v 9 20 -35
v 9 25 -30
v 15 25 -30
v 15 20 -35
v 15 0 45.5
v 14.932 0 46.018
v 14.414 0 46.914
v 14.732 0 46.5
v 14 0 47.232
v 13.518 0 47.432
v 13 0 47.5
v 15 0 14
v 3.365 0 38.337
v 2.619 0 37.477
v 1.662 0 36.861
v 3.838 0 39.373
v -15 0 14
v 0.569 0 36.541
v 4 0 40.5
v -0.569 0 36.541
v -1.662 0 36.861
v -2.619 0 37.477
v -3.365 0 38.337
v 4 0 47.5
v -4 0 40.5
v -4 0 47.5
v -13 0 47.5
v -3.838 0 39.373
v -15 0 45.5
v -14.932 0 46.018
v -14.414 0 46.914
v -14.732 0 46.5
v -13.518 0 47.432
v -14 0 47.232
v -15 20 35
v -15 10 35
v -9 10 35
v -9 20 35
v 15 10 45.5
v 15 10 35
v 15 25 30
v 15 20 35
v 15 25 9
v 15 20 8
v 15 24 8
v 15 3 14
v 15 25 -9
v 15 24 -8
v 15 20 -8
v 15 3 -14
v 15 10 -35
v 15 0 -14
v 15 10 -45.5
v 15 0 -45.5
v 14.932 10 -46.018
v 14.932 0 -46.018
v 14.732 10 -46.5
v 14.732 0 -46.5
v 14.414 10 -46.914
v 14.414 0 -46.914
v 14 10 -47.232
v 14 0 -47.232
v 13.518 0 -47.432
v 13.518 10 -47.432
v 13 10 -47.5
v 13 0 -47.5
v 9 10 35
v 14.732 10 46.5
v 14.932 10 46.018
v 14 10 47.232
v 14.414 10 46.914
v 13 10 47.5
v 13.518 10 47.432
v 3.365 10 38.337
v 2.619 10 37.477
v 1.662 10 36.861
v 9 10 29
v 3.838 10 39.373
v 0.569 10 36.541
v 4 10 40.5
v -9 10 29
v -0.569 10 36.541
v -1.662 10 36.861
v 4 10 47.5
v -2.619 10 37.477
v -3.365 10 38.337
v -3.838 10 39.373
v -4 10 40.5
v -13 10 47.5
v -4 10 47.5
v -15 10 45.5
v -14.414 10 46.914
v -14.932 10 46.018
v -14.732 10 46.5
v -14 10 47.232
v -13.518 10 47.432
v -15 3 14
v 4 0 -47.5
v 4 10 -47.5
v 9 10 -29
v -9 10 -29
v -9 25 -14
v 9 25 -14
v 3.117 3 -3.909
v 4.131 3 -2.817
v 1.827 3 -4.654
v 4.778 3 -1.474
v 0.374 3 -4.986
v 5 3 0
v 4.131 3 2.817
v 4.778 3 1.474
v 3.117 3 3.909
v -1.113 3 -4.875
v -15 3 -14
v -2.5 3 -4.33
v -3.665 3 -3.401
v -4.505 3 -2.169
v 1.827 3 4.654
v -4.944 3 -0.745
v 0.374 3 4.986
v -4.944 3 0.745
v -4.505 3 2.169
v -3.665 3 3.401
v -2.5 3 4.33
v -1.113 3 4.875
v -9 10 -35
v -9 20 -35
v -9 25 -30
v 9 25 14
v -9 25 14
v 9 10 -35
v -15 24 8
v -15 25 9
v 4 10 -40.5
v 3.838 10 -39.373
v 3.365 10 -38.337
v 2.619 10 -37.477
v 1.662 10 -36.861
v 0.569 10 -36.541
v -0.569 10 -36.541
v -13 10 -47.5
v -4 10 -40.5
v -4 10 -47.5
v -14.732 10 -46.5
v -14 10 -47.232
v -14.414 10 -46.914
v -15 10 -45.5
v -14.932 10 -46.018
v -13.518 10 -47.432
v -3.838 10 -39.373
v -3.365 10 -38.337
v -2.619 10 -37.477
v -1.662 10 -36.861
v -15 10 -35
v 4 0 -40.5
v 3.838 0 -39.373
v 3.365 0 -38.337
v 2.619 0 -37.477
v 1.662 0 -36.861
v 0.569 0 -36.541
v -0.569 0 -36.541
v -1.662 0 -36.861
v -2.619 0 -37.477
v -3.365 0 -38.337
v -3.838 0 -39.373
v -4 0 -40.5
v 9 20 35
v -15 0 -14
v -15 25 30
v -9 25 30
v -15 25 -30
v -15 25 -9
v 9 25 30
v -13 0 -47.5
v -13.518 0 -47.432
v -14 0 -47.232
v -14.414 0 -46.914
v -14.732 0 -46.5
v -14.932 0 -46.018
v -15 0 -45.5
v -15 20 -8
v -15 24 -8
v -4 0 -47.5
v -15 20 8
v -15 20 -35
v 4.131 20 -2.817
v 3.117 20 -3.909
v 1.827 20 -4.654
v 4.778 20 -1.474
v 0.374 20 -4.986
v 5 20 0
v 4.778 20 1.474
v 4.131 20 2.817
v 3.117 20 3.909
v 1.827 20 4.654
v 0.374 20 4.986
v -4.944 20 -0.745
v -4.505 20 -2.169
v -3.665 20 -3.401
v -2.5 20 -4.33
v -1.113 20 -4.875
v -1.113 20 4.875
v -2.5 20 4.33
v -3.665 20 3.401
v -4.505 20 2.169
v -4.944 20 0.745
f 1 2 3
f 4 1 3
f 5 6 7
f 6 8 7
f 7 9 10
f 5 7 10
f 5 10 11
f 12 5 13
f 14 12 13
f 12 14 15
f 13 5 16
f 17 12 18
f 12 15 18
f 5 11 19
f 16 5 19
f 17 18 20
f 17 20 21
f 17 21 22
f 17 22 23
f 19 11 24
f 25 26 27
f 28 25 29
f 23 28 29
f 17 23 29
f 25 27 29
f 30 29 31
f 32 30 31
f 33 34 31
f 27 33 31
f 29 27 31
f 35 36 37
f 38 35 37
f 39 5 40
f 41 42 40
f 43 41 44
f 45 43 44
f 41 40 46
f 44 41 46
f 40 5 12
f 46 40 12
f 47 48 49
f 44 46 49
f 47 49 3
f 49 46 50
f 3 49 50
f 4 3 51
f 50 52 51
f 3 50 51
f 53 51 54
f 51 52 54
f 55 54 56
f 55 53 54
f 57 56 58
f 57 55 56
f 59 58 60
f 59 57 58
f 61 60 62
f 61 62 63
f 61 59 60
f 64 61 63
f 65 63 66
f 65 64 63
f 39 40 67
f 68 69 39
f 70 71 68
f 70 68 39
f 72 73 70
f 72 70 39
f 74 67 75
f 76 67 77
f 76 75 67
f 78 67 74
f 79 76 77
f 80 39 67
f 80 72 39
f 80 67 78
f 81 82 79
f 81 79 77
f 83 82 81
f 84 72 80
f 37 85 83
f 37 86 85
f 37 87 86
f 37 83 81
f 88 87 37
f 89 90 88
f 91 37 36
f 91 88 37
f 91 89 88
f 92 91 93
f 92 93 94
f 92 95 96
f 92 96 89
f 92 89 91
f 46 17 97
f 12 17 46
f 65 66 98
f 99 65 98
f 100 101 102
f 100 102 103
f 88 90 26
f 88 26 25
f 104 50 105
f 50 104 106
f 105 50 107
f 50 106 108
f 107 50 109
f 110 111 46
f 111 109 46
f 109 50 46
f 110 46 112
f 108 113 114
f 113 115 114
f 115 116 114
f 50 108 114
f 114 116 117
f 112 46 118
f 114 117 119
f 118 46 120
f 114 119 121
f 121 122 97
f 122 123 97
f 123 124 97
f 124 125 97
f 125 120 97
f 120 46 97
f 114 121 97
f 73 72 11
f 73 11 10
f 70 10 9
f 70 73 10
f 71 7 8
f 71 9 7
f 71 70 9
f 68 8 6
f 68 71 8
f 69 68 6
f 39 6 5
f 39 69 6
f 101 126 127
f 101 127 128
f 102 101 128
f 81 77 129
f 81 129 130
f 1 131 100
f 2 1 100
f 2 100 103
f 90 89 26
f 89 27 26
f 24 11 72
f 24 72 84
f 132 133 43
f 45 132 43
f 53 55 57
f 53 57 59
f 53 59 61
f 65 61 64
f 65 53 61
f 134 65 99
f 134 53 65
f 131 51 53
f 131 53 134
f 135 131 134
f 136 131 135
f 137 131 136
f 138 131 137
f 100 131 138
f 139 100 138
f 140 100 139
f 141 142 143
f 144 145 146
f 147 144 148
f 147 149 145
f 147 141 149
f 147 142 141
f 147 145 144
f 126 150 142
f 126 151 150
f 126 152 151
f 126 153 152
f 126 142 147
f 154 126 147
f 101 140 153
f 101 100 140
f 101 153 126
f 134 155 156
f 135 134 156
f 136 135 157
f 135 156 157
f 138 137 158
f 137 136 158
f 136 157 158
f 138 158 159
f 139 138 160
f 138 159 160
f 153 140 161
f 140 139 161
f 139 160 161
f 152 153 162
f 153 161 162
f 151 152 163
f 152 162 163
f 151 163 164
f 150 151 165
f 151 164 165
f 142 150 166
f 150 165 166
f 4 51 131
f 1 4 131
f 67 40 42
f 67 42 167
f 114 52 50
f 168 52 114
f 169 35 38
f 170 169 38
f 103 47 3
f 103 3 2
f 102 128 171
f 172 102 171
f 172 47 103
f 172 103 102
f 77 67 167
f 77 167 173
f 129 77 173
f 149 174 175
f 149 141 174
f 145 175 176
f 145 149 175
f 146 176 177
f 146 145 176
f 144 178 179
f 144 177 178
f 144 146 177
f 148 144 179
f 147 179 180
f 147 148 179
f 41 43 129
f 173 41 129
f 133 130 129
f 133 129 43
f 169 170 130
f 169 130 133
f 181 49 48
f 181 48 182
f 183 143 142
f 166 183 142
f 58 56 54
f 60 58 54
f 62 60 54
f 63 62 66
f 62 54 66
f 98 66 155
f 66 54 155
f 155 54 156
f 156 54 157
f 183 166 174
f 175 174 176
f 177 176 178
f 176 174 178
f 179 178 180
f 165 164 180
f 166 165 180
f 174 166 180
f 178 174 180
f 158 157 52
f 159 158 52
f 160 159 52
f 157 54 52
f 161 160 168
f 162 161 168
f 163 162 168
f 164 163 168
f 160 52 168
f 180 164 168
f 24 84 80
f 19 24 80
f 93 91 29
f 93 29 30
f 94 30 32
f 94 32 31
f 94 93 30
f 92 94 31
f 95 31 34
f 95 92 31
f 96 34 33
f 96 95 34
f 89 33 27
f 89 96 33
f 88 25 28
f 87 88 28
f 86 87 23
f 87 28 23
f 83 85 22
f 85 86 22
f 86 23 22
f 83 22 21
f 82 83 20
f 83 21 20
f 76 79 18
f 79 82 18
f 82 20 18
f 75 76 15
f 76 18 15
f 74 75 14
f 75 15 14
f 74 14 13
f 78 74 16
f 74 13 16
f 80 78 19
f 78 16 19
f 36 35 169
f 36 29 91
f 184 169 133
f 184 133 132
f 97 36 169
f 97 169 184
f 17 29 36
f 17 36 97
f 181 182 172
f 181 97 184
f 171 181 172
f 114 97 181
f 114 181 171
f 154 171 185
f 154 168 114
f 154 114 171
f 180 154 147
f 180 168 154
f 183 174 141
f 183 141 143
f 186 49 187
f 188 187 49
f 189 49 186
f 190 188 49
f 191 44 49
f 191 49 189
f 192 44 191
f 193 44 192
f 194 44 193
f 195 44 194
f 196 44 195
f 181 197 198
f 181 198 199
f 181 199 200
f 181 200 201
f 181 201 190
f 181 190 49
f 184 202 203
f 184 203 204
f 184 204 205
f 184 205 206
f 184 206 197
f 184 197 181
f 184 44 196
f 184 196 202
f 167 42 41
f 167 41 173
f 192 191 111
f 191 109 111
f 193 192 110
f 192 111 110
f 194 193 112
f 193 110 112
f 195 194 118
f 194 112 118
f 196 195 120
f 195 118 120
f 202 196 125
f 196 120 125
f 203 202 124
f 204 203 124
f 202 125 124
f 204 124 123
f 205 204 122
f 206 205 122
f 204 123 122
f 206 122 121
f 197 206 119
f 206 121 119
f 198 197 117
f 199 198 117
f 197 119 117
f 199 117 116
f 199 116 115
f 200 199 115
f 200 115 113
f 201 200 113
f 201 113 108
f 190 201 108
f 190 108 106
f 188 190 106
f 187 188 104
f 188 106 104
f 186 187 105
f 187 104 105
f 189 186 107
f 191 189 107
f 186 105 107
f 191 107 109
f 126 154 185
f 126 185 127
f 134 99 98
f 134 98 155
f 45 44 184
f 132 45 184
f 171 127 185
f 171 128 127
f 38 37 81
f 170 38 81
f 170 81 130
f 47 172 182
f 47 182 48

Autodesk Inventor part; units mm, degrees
ref_plane "YZ Plane" through (0, 0, 0) normal (1, 0, 0) x (0, 1, 0)
ref_plane "XZ Plane" through (0, 0, 0) normal (0, 1, 0) x (-1, 0, 0)
ref_plane "XY Plane" through (0, 0, 0) normal (0, 0, 1) x (1, 0, 0)
sketch "Schizzo1" plane through (0, 0, 0) normal (0, 1, 0) x (-1, 0, 0)
  line L0 (0, 0) -> (15, 0) construction
  line L1 (15, 0) -> (15, -47.5)
  line L2 (15, -47.5) -> (4, -47.5)
  line L3 (4, -47.5) -> (4, -40.5)
  line L4 (0, 0) -> (0, -36.5) construction
  arc A0 (4, -40.5) -> (0, -36.5) centre (0, -40.5) ccw
  arc A1 (0, -5) -> (5, 0) centre (0, 0) ccw
  line L5 (0, 0) -> (0, -8) construction
  line L6 (0, -8) -> (15, -8)
  line L7 (15, 0) -> (15, -14)
  line L8 (15, -14) -> (0, -14)
  line L9 (15, -35) -> (9, -35)
  line L10 (9, -35) -> (9, -14)
  line L11 (0, 0) -> (-15, 0) construction
  line L12 (-15, 0) -> (-15, -47.5)
  line L13 (-15, -47.5) -> (-4, -47.5)
  line L14 (-4, -47.5) -> (-4, -40.5)
  arc A2 (0, -36.5) -> (-4, -40.5) centre (0, -40.5) ccw
  arc A3 (-5, 0) -> (0, -5) centre (0, 0) ccw
  line L15 (0, -8) -> (-15, -8)
  line L16 (-15, 0) -> (-15, -14)
  line L17 (-15, -14) -> (0, -14)
  line L18 (-15, -35) -> (-9, -35)
  line L19 (-9, -35) -> (-9, -14)
  line L20 (15, 0) -> (15, 47.5)
  line L21 (15, 47.5) -> (4, 47.5)
  line L22 (4, 47.5) -> (4, 40.5)
  line L23 (0, 0) -> (0, 36.5) construction
  arc A4 (0, 36.5) -> (4, 40.5) centre (0, 40.5) ccw
  arc A5 (5, 0) -> (0, 5) centre (0, 0) ccw
  line L24 (0, 0) -> (0, 8) construction
  line L25 (0, 8) -> (15, 8)
  line L26 (15, 0) -> (15, 14)
  line L27 (15, 14) -> (0, 14)
  line L28 (15, 35) -> (9, 35)
  line L29 (9, 35) -> (9, 14)
  arc A6 (-4, 40.5) -> (0, 36.5) centre (0, 40.5) ccw
  line L30 (-15, 47.5) -> (-4, 47.5)
  line L31 (-4, 47.5) -> (-4, 40.5)
  line L32 (-15, 35) -> (-9, 35)
  line L33 (-15, 14) -> (0, 14)
  line L34 (-9, 35) -> (-9, 14)
  line L35 (-15, 0) -> (-15, 47.5)
  line L36 (0, 8) -> (-15, 8)
  arc A7 (0, 5) -> (-5, 0) centre (0, 0) ccw
  line L37 (-15, 0) -> (-15, 14)
  dimension "d0" = 15
  dimension "d1" = 47.5
  dimension "d2" = 11
  dimension "d5" = 5
  dimension "d6" = 8
  dimension "d7" = 14
  dimension "d8" = 6
extrude "Estrusione1" add sketch "Schizzo1" along normal blind 10 contours L1 L2 L3 A0 A2 L14 L13 L12 L18 L19 L17 L8 L10 L9 | L28 L29 L27 L33 L34 L32 L35 L30 L31 A6 A4 L22 L21 L20
extrude "Estrusione2" add sketch "Schizzo1" along normal blind 25 contours L1 L8 L17 L12 L15 L6 | L25 L36 L35 L33 L27 L20 | L1 L9 L10 L8 | L27 L29 L28 L20 | L17 L19 L18 L12 | L35 L32 L34 L33
extrude "Estrusione3" add sketch "Schizzo1" along normal blind 20 contours L1 L6 L15 L12 L35 L36 L25 L20
sketch "Schizzo1 outline for Estrusione4" plane through (0, 0, 0) normal (0, 1, 0) x (-1, 0, 0)
  line L0 (-15, 0) -> (-15, -14)
  line L1 (-15, 14) -> (-15, 0)
  line L2 (-15, -14) -> (0, -14)
  line L3 (0, 14) -> (-15, 14)
  line L4 (0, -14) -> (15, -14)
  line L5 (15, 14) -> (0, 14)
  line L6 (15, -14) -> (15, 0)
  line L7 (15, 0) -> (15, 14)
  arc A0 (0, -5) -> (-5, 0) centre (0, 0) cw
  arc A1 (5, 0) -> (0, -5) centre (0, 0) cw
  arc A2 (0, 5) -> (5, 0) centre (0, 0) cw
  arc A3 (-5, 0) -> (0, 5) centre (0, 0) cw
extrude "Estrusione4" cut sketch "Schizzo1 outline for Estrusione4" along normal blind 3
chamfer "Smusso1" distance 15 angle 45 1 edges at (0, 10, 14) measured on face at (-3, 15, 14)
chamfer "Smusso2" distance 15 angle 45 1 edges at (0, 10, -14) measured on face at (3, 15, -14)
chamfer "Smusso3" distance 5 angle 45 2 edges at (-12, 25, -35) (12, 25, -35) measured on face at (3, 25, -10)
chamfer "Smusso4" distance 5 angle 45 2 edges at (12, 25, 35) (-12, 25, 35) measured on face at (-3, 25, 10)
fillet "Raccordo1" radius 2 4 edges at (-15, 5, -47.5) (-15, 5, 47.5) (15, 5, 47.5) (15, 5, -47.5)
chamfer "Smusso5" distance 1 angle 45 1 edges at (0, 25, -8) measured on face at (-3, 25, -10)
chamfer "Smusso6" distance 1 angle 45 1 edges at (0, 25, 8) measured on face at (-3, 25, 10)
properties part number "esercizio 040.30 03-02-2023"
